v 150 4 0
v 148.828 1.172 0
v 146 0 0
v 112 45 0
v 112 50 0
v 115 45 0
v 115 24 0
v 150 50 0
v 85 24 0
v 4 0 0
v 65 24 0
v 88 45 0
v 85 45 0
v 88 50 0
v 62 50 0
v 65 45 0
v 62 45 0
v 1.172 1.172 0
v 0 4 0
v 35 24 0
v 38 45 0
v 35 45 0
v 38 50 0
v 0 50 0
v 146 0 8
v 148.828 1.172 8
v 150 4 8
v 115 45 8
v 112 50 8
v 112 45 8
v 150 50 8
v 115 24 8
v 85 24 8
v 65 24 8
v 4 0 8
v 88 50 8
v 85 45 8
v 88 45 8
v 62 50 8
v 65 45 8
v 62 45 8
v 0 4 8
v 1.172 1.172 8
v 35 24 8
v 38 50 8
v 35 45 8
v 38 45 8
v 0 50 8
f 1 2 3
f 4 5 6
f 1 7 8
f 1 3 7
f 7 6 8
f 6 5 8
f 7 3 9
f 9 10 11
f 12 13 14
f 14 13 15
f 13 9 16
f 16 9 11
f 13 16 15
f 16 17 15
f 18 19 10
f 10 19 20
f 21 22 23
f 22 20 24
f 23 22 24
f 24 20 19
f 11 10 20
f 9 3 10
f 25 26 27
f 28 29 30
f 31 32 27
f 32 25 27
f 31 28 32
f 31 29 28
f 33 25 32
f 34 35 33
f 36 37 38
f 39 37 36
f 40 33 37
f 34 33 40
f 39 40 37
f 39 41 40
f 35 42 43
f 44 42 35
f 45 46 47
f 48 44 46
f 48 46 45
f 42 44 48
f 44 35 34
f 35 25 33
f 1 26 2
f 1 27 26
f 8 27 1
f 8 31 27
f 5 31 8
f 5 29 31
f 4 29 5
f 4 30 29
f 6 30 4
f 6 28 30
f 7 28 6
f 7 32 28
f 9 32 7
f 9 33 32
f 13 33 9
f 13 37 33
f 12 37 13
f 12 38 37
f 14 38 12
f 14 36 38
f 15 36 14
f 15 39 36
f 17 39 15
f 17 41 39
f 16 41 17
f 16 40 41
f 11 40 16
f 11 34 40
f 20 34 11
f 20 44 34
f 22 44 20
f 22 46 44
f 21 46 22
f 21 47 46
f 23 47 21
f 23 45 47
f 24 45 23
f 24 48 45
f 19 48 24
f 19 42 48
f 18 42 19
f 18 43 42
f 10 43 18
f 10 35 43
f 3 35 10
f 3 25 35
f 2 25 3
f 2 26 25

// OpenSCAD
$fn = 32;

// ----------------------------------------------------------------------
// Oversize slot bar: 150 mm bar with 2 oversize windows
// ----------------------------------------------------------------------

// --- parameters (mm) ---
profile_height = 8;       // extrusion height
profile_points = 24;      // points of the closed outline

profile = [[0, 4], [1.172, 1.172], [4, 0], [146, 0], [148.828, 1.172], [150, 4], [150, 50], [112, 50], [112, 45], [115, 45], [115, 24], [85, 24], [85, 45], [88, 45], [88, 50], [62, 50], [62, 45], [65, 45], [65, 24], [35, 24], [35, 45], [38, 45], [38, 50], [0, 50]];  // single closed polygon, 24 points, counter clockwise

// --- the one profile operation ---
linear_extrude(height = profile_height) polygon(points = profile);
